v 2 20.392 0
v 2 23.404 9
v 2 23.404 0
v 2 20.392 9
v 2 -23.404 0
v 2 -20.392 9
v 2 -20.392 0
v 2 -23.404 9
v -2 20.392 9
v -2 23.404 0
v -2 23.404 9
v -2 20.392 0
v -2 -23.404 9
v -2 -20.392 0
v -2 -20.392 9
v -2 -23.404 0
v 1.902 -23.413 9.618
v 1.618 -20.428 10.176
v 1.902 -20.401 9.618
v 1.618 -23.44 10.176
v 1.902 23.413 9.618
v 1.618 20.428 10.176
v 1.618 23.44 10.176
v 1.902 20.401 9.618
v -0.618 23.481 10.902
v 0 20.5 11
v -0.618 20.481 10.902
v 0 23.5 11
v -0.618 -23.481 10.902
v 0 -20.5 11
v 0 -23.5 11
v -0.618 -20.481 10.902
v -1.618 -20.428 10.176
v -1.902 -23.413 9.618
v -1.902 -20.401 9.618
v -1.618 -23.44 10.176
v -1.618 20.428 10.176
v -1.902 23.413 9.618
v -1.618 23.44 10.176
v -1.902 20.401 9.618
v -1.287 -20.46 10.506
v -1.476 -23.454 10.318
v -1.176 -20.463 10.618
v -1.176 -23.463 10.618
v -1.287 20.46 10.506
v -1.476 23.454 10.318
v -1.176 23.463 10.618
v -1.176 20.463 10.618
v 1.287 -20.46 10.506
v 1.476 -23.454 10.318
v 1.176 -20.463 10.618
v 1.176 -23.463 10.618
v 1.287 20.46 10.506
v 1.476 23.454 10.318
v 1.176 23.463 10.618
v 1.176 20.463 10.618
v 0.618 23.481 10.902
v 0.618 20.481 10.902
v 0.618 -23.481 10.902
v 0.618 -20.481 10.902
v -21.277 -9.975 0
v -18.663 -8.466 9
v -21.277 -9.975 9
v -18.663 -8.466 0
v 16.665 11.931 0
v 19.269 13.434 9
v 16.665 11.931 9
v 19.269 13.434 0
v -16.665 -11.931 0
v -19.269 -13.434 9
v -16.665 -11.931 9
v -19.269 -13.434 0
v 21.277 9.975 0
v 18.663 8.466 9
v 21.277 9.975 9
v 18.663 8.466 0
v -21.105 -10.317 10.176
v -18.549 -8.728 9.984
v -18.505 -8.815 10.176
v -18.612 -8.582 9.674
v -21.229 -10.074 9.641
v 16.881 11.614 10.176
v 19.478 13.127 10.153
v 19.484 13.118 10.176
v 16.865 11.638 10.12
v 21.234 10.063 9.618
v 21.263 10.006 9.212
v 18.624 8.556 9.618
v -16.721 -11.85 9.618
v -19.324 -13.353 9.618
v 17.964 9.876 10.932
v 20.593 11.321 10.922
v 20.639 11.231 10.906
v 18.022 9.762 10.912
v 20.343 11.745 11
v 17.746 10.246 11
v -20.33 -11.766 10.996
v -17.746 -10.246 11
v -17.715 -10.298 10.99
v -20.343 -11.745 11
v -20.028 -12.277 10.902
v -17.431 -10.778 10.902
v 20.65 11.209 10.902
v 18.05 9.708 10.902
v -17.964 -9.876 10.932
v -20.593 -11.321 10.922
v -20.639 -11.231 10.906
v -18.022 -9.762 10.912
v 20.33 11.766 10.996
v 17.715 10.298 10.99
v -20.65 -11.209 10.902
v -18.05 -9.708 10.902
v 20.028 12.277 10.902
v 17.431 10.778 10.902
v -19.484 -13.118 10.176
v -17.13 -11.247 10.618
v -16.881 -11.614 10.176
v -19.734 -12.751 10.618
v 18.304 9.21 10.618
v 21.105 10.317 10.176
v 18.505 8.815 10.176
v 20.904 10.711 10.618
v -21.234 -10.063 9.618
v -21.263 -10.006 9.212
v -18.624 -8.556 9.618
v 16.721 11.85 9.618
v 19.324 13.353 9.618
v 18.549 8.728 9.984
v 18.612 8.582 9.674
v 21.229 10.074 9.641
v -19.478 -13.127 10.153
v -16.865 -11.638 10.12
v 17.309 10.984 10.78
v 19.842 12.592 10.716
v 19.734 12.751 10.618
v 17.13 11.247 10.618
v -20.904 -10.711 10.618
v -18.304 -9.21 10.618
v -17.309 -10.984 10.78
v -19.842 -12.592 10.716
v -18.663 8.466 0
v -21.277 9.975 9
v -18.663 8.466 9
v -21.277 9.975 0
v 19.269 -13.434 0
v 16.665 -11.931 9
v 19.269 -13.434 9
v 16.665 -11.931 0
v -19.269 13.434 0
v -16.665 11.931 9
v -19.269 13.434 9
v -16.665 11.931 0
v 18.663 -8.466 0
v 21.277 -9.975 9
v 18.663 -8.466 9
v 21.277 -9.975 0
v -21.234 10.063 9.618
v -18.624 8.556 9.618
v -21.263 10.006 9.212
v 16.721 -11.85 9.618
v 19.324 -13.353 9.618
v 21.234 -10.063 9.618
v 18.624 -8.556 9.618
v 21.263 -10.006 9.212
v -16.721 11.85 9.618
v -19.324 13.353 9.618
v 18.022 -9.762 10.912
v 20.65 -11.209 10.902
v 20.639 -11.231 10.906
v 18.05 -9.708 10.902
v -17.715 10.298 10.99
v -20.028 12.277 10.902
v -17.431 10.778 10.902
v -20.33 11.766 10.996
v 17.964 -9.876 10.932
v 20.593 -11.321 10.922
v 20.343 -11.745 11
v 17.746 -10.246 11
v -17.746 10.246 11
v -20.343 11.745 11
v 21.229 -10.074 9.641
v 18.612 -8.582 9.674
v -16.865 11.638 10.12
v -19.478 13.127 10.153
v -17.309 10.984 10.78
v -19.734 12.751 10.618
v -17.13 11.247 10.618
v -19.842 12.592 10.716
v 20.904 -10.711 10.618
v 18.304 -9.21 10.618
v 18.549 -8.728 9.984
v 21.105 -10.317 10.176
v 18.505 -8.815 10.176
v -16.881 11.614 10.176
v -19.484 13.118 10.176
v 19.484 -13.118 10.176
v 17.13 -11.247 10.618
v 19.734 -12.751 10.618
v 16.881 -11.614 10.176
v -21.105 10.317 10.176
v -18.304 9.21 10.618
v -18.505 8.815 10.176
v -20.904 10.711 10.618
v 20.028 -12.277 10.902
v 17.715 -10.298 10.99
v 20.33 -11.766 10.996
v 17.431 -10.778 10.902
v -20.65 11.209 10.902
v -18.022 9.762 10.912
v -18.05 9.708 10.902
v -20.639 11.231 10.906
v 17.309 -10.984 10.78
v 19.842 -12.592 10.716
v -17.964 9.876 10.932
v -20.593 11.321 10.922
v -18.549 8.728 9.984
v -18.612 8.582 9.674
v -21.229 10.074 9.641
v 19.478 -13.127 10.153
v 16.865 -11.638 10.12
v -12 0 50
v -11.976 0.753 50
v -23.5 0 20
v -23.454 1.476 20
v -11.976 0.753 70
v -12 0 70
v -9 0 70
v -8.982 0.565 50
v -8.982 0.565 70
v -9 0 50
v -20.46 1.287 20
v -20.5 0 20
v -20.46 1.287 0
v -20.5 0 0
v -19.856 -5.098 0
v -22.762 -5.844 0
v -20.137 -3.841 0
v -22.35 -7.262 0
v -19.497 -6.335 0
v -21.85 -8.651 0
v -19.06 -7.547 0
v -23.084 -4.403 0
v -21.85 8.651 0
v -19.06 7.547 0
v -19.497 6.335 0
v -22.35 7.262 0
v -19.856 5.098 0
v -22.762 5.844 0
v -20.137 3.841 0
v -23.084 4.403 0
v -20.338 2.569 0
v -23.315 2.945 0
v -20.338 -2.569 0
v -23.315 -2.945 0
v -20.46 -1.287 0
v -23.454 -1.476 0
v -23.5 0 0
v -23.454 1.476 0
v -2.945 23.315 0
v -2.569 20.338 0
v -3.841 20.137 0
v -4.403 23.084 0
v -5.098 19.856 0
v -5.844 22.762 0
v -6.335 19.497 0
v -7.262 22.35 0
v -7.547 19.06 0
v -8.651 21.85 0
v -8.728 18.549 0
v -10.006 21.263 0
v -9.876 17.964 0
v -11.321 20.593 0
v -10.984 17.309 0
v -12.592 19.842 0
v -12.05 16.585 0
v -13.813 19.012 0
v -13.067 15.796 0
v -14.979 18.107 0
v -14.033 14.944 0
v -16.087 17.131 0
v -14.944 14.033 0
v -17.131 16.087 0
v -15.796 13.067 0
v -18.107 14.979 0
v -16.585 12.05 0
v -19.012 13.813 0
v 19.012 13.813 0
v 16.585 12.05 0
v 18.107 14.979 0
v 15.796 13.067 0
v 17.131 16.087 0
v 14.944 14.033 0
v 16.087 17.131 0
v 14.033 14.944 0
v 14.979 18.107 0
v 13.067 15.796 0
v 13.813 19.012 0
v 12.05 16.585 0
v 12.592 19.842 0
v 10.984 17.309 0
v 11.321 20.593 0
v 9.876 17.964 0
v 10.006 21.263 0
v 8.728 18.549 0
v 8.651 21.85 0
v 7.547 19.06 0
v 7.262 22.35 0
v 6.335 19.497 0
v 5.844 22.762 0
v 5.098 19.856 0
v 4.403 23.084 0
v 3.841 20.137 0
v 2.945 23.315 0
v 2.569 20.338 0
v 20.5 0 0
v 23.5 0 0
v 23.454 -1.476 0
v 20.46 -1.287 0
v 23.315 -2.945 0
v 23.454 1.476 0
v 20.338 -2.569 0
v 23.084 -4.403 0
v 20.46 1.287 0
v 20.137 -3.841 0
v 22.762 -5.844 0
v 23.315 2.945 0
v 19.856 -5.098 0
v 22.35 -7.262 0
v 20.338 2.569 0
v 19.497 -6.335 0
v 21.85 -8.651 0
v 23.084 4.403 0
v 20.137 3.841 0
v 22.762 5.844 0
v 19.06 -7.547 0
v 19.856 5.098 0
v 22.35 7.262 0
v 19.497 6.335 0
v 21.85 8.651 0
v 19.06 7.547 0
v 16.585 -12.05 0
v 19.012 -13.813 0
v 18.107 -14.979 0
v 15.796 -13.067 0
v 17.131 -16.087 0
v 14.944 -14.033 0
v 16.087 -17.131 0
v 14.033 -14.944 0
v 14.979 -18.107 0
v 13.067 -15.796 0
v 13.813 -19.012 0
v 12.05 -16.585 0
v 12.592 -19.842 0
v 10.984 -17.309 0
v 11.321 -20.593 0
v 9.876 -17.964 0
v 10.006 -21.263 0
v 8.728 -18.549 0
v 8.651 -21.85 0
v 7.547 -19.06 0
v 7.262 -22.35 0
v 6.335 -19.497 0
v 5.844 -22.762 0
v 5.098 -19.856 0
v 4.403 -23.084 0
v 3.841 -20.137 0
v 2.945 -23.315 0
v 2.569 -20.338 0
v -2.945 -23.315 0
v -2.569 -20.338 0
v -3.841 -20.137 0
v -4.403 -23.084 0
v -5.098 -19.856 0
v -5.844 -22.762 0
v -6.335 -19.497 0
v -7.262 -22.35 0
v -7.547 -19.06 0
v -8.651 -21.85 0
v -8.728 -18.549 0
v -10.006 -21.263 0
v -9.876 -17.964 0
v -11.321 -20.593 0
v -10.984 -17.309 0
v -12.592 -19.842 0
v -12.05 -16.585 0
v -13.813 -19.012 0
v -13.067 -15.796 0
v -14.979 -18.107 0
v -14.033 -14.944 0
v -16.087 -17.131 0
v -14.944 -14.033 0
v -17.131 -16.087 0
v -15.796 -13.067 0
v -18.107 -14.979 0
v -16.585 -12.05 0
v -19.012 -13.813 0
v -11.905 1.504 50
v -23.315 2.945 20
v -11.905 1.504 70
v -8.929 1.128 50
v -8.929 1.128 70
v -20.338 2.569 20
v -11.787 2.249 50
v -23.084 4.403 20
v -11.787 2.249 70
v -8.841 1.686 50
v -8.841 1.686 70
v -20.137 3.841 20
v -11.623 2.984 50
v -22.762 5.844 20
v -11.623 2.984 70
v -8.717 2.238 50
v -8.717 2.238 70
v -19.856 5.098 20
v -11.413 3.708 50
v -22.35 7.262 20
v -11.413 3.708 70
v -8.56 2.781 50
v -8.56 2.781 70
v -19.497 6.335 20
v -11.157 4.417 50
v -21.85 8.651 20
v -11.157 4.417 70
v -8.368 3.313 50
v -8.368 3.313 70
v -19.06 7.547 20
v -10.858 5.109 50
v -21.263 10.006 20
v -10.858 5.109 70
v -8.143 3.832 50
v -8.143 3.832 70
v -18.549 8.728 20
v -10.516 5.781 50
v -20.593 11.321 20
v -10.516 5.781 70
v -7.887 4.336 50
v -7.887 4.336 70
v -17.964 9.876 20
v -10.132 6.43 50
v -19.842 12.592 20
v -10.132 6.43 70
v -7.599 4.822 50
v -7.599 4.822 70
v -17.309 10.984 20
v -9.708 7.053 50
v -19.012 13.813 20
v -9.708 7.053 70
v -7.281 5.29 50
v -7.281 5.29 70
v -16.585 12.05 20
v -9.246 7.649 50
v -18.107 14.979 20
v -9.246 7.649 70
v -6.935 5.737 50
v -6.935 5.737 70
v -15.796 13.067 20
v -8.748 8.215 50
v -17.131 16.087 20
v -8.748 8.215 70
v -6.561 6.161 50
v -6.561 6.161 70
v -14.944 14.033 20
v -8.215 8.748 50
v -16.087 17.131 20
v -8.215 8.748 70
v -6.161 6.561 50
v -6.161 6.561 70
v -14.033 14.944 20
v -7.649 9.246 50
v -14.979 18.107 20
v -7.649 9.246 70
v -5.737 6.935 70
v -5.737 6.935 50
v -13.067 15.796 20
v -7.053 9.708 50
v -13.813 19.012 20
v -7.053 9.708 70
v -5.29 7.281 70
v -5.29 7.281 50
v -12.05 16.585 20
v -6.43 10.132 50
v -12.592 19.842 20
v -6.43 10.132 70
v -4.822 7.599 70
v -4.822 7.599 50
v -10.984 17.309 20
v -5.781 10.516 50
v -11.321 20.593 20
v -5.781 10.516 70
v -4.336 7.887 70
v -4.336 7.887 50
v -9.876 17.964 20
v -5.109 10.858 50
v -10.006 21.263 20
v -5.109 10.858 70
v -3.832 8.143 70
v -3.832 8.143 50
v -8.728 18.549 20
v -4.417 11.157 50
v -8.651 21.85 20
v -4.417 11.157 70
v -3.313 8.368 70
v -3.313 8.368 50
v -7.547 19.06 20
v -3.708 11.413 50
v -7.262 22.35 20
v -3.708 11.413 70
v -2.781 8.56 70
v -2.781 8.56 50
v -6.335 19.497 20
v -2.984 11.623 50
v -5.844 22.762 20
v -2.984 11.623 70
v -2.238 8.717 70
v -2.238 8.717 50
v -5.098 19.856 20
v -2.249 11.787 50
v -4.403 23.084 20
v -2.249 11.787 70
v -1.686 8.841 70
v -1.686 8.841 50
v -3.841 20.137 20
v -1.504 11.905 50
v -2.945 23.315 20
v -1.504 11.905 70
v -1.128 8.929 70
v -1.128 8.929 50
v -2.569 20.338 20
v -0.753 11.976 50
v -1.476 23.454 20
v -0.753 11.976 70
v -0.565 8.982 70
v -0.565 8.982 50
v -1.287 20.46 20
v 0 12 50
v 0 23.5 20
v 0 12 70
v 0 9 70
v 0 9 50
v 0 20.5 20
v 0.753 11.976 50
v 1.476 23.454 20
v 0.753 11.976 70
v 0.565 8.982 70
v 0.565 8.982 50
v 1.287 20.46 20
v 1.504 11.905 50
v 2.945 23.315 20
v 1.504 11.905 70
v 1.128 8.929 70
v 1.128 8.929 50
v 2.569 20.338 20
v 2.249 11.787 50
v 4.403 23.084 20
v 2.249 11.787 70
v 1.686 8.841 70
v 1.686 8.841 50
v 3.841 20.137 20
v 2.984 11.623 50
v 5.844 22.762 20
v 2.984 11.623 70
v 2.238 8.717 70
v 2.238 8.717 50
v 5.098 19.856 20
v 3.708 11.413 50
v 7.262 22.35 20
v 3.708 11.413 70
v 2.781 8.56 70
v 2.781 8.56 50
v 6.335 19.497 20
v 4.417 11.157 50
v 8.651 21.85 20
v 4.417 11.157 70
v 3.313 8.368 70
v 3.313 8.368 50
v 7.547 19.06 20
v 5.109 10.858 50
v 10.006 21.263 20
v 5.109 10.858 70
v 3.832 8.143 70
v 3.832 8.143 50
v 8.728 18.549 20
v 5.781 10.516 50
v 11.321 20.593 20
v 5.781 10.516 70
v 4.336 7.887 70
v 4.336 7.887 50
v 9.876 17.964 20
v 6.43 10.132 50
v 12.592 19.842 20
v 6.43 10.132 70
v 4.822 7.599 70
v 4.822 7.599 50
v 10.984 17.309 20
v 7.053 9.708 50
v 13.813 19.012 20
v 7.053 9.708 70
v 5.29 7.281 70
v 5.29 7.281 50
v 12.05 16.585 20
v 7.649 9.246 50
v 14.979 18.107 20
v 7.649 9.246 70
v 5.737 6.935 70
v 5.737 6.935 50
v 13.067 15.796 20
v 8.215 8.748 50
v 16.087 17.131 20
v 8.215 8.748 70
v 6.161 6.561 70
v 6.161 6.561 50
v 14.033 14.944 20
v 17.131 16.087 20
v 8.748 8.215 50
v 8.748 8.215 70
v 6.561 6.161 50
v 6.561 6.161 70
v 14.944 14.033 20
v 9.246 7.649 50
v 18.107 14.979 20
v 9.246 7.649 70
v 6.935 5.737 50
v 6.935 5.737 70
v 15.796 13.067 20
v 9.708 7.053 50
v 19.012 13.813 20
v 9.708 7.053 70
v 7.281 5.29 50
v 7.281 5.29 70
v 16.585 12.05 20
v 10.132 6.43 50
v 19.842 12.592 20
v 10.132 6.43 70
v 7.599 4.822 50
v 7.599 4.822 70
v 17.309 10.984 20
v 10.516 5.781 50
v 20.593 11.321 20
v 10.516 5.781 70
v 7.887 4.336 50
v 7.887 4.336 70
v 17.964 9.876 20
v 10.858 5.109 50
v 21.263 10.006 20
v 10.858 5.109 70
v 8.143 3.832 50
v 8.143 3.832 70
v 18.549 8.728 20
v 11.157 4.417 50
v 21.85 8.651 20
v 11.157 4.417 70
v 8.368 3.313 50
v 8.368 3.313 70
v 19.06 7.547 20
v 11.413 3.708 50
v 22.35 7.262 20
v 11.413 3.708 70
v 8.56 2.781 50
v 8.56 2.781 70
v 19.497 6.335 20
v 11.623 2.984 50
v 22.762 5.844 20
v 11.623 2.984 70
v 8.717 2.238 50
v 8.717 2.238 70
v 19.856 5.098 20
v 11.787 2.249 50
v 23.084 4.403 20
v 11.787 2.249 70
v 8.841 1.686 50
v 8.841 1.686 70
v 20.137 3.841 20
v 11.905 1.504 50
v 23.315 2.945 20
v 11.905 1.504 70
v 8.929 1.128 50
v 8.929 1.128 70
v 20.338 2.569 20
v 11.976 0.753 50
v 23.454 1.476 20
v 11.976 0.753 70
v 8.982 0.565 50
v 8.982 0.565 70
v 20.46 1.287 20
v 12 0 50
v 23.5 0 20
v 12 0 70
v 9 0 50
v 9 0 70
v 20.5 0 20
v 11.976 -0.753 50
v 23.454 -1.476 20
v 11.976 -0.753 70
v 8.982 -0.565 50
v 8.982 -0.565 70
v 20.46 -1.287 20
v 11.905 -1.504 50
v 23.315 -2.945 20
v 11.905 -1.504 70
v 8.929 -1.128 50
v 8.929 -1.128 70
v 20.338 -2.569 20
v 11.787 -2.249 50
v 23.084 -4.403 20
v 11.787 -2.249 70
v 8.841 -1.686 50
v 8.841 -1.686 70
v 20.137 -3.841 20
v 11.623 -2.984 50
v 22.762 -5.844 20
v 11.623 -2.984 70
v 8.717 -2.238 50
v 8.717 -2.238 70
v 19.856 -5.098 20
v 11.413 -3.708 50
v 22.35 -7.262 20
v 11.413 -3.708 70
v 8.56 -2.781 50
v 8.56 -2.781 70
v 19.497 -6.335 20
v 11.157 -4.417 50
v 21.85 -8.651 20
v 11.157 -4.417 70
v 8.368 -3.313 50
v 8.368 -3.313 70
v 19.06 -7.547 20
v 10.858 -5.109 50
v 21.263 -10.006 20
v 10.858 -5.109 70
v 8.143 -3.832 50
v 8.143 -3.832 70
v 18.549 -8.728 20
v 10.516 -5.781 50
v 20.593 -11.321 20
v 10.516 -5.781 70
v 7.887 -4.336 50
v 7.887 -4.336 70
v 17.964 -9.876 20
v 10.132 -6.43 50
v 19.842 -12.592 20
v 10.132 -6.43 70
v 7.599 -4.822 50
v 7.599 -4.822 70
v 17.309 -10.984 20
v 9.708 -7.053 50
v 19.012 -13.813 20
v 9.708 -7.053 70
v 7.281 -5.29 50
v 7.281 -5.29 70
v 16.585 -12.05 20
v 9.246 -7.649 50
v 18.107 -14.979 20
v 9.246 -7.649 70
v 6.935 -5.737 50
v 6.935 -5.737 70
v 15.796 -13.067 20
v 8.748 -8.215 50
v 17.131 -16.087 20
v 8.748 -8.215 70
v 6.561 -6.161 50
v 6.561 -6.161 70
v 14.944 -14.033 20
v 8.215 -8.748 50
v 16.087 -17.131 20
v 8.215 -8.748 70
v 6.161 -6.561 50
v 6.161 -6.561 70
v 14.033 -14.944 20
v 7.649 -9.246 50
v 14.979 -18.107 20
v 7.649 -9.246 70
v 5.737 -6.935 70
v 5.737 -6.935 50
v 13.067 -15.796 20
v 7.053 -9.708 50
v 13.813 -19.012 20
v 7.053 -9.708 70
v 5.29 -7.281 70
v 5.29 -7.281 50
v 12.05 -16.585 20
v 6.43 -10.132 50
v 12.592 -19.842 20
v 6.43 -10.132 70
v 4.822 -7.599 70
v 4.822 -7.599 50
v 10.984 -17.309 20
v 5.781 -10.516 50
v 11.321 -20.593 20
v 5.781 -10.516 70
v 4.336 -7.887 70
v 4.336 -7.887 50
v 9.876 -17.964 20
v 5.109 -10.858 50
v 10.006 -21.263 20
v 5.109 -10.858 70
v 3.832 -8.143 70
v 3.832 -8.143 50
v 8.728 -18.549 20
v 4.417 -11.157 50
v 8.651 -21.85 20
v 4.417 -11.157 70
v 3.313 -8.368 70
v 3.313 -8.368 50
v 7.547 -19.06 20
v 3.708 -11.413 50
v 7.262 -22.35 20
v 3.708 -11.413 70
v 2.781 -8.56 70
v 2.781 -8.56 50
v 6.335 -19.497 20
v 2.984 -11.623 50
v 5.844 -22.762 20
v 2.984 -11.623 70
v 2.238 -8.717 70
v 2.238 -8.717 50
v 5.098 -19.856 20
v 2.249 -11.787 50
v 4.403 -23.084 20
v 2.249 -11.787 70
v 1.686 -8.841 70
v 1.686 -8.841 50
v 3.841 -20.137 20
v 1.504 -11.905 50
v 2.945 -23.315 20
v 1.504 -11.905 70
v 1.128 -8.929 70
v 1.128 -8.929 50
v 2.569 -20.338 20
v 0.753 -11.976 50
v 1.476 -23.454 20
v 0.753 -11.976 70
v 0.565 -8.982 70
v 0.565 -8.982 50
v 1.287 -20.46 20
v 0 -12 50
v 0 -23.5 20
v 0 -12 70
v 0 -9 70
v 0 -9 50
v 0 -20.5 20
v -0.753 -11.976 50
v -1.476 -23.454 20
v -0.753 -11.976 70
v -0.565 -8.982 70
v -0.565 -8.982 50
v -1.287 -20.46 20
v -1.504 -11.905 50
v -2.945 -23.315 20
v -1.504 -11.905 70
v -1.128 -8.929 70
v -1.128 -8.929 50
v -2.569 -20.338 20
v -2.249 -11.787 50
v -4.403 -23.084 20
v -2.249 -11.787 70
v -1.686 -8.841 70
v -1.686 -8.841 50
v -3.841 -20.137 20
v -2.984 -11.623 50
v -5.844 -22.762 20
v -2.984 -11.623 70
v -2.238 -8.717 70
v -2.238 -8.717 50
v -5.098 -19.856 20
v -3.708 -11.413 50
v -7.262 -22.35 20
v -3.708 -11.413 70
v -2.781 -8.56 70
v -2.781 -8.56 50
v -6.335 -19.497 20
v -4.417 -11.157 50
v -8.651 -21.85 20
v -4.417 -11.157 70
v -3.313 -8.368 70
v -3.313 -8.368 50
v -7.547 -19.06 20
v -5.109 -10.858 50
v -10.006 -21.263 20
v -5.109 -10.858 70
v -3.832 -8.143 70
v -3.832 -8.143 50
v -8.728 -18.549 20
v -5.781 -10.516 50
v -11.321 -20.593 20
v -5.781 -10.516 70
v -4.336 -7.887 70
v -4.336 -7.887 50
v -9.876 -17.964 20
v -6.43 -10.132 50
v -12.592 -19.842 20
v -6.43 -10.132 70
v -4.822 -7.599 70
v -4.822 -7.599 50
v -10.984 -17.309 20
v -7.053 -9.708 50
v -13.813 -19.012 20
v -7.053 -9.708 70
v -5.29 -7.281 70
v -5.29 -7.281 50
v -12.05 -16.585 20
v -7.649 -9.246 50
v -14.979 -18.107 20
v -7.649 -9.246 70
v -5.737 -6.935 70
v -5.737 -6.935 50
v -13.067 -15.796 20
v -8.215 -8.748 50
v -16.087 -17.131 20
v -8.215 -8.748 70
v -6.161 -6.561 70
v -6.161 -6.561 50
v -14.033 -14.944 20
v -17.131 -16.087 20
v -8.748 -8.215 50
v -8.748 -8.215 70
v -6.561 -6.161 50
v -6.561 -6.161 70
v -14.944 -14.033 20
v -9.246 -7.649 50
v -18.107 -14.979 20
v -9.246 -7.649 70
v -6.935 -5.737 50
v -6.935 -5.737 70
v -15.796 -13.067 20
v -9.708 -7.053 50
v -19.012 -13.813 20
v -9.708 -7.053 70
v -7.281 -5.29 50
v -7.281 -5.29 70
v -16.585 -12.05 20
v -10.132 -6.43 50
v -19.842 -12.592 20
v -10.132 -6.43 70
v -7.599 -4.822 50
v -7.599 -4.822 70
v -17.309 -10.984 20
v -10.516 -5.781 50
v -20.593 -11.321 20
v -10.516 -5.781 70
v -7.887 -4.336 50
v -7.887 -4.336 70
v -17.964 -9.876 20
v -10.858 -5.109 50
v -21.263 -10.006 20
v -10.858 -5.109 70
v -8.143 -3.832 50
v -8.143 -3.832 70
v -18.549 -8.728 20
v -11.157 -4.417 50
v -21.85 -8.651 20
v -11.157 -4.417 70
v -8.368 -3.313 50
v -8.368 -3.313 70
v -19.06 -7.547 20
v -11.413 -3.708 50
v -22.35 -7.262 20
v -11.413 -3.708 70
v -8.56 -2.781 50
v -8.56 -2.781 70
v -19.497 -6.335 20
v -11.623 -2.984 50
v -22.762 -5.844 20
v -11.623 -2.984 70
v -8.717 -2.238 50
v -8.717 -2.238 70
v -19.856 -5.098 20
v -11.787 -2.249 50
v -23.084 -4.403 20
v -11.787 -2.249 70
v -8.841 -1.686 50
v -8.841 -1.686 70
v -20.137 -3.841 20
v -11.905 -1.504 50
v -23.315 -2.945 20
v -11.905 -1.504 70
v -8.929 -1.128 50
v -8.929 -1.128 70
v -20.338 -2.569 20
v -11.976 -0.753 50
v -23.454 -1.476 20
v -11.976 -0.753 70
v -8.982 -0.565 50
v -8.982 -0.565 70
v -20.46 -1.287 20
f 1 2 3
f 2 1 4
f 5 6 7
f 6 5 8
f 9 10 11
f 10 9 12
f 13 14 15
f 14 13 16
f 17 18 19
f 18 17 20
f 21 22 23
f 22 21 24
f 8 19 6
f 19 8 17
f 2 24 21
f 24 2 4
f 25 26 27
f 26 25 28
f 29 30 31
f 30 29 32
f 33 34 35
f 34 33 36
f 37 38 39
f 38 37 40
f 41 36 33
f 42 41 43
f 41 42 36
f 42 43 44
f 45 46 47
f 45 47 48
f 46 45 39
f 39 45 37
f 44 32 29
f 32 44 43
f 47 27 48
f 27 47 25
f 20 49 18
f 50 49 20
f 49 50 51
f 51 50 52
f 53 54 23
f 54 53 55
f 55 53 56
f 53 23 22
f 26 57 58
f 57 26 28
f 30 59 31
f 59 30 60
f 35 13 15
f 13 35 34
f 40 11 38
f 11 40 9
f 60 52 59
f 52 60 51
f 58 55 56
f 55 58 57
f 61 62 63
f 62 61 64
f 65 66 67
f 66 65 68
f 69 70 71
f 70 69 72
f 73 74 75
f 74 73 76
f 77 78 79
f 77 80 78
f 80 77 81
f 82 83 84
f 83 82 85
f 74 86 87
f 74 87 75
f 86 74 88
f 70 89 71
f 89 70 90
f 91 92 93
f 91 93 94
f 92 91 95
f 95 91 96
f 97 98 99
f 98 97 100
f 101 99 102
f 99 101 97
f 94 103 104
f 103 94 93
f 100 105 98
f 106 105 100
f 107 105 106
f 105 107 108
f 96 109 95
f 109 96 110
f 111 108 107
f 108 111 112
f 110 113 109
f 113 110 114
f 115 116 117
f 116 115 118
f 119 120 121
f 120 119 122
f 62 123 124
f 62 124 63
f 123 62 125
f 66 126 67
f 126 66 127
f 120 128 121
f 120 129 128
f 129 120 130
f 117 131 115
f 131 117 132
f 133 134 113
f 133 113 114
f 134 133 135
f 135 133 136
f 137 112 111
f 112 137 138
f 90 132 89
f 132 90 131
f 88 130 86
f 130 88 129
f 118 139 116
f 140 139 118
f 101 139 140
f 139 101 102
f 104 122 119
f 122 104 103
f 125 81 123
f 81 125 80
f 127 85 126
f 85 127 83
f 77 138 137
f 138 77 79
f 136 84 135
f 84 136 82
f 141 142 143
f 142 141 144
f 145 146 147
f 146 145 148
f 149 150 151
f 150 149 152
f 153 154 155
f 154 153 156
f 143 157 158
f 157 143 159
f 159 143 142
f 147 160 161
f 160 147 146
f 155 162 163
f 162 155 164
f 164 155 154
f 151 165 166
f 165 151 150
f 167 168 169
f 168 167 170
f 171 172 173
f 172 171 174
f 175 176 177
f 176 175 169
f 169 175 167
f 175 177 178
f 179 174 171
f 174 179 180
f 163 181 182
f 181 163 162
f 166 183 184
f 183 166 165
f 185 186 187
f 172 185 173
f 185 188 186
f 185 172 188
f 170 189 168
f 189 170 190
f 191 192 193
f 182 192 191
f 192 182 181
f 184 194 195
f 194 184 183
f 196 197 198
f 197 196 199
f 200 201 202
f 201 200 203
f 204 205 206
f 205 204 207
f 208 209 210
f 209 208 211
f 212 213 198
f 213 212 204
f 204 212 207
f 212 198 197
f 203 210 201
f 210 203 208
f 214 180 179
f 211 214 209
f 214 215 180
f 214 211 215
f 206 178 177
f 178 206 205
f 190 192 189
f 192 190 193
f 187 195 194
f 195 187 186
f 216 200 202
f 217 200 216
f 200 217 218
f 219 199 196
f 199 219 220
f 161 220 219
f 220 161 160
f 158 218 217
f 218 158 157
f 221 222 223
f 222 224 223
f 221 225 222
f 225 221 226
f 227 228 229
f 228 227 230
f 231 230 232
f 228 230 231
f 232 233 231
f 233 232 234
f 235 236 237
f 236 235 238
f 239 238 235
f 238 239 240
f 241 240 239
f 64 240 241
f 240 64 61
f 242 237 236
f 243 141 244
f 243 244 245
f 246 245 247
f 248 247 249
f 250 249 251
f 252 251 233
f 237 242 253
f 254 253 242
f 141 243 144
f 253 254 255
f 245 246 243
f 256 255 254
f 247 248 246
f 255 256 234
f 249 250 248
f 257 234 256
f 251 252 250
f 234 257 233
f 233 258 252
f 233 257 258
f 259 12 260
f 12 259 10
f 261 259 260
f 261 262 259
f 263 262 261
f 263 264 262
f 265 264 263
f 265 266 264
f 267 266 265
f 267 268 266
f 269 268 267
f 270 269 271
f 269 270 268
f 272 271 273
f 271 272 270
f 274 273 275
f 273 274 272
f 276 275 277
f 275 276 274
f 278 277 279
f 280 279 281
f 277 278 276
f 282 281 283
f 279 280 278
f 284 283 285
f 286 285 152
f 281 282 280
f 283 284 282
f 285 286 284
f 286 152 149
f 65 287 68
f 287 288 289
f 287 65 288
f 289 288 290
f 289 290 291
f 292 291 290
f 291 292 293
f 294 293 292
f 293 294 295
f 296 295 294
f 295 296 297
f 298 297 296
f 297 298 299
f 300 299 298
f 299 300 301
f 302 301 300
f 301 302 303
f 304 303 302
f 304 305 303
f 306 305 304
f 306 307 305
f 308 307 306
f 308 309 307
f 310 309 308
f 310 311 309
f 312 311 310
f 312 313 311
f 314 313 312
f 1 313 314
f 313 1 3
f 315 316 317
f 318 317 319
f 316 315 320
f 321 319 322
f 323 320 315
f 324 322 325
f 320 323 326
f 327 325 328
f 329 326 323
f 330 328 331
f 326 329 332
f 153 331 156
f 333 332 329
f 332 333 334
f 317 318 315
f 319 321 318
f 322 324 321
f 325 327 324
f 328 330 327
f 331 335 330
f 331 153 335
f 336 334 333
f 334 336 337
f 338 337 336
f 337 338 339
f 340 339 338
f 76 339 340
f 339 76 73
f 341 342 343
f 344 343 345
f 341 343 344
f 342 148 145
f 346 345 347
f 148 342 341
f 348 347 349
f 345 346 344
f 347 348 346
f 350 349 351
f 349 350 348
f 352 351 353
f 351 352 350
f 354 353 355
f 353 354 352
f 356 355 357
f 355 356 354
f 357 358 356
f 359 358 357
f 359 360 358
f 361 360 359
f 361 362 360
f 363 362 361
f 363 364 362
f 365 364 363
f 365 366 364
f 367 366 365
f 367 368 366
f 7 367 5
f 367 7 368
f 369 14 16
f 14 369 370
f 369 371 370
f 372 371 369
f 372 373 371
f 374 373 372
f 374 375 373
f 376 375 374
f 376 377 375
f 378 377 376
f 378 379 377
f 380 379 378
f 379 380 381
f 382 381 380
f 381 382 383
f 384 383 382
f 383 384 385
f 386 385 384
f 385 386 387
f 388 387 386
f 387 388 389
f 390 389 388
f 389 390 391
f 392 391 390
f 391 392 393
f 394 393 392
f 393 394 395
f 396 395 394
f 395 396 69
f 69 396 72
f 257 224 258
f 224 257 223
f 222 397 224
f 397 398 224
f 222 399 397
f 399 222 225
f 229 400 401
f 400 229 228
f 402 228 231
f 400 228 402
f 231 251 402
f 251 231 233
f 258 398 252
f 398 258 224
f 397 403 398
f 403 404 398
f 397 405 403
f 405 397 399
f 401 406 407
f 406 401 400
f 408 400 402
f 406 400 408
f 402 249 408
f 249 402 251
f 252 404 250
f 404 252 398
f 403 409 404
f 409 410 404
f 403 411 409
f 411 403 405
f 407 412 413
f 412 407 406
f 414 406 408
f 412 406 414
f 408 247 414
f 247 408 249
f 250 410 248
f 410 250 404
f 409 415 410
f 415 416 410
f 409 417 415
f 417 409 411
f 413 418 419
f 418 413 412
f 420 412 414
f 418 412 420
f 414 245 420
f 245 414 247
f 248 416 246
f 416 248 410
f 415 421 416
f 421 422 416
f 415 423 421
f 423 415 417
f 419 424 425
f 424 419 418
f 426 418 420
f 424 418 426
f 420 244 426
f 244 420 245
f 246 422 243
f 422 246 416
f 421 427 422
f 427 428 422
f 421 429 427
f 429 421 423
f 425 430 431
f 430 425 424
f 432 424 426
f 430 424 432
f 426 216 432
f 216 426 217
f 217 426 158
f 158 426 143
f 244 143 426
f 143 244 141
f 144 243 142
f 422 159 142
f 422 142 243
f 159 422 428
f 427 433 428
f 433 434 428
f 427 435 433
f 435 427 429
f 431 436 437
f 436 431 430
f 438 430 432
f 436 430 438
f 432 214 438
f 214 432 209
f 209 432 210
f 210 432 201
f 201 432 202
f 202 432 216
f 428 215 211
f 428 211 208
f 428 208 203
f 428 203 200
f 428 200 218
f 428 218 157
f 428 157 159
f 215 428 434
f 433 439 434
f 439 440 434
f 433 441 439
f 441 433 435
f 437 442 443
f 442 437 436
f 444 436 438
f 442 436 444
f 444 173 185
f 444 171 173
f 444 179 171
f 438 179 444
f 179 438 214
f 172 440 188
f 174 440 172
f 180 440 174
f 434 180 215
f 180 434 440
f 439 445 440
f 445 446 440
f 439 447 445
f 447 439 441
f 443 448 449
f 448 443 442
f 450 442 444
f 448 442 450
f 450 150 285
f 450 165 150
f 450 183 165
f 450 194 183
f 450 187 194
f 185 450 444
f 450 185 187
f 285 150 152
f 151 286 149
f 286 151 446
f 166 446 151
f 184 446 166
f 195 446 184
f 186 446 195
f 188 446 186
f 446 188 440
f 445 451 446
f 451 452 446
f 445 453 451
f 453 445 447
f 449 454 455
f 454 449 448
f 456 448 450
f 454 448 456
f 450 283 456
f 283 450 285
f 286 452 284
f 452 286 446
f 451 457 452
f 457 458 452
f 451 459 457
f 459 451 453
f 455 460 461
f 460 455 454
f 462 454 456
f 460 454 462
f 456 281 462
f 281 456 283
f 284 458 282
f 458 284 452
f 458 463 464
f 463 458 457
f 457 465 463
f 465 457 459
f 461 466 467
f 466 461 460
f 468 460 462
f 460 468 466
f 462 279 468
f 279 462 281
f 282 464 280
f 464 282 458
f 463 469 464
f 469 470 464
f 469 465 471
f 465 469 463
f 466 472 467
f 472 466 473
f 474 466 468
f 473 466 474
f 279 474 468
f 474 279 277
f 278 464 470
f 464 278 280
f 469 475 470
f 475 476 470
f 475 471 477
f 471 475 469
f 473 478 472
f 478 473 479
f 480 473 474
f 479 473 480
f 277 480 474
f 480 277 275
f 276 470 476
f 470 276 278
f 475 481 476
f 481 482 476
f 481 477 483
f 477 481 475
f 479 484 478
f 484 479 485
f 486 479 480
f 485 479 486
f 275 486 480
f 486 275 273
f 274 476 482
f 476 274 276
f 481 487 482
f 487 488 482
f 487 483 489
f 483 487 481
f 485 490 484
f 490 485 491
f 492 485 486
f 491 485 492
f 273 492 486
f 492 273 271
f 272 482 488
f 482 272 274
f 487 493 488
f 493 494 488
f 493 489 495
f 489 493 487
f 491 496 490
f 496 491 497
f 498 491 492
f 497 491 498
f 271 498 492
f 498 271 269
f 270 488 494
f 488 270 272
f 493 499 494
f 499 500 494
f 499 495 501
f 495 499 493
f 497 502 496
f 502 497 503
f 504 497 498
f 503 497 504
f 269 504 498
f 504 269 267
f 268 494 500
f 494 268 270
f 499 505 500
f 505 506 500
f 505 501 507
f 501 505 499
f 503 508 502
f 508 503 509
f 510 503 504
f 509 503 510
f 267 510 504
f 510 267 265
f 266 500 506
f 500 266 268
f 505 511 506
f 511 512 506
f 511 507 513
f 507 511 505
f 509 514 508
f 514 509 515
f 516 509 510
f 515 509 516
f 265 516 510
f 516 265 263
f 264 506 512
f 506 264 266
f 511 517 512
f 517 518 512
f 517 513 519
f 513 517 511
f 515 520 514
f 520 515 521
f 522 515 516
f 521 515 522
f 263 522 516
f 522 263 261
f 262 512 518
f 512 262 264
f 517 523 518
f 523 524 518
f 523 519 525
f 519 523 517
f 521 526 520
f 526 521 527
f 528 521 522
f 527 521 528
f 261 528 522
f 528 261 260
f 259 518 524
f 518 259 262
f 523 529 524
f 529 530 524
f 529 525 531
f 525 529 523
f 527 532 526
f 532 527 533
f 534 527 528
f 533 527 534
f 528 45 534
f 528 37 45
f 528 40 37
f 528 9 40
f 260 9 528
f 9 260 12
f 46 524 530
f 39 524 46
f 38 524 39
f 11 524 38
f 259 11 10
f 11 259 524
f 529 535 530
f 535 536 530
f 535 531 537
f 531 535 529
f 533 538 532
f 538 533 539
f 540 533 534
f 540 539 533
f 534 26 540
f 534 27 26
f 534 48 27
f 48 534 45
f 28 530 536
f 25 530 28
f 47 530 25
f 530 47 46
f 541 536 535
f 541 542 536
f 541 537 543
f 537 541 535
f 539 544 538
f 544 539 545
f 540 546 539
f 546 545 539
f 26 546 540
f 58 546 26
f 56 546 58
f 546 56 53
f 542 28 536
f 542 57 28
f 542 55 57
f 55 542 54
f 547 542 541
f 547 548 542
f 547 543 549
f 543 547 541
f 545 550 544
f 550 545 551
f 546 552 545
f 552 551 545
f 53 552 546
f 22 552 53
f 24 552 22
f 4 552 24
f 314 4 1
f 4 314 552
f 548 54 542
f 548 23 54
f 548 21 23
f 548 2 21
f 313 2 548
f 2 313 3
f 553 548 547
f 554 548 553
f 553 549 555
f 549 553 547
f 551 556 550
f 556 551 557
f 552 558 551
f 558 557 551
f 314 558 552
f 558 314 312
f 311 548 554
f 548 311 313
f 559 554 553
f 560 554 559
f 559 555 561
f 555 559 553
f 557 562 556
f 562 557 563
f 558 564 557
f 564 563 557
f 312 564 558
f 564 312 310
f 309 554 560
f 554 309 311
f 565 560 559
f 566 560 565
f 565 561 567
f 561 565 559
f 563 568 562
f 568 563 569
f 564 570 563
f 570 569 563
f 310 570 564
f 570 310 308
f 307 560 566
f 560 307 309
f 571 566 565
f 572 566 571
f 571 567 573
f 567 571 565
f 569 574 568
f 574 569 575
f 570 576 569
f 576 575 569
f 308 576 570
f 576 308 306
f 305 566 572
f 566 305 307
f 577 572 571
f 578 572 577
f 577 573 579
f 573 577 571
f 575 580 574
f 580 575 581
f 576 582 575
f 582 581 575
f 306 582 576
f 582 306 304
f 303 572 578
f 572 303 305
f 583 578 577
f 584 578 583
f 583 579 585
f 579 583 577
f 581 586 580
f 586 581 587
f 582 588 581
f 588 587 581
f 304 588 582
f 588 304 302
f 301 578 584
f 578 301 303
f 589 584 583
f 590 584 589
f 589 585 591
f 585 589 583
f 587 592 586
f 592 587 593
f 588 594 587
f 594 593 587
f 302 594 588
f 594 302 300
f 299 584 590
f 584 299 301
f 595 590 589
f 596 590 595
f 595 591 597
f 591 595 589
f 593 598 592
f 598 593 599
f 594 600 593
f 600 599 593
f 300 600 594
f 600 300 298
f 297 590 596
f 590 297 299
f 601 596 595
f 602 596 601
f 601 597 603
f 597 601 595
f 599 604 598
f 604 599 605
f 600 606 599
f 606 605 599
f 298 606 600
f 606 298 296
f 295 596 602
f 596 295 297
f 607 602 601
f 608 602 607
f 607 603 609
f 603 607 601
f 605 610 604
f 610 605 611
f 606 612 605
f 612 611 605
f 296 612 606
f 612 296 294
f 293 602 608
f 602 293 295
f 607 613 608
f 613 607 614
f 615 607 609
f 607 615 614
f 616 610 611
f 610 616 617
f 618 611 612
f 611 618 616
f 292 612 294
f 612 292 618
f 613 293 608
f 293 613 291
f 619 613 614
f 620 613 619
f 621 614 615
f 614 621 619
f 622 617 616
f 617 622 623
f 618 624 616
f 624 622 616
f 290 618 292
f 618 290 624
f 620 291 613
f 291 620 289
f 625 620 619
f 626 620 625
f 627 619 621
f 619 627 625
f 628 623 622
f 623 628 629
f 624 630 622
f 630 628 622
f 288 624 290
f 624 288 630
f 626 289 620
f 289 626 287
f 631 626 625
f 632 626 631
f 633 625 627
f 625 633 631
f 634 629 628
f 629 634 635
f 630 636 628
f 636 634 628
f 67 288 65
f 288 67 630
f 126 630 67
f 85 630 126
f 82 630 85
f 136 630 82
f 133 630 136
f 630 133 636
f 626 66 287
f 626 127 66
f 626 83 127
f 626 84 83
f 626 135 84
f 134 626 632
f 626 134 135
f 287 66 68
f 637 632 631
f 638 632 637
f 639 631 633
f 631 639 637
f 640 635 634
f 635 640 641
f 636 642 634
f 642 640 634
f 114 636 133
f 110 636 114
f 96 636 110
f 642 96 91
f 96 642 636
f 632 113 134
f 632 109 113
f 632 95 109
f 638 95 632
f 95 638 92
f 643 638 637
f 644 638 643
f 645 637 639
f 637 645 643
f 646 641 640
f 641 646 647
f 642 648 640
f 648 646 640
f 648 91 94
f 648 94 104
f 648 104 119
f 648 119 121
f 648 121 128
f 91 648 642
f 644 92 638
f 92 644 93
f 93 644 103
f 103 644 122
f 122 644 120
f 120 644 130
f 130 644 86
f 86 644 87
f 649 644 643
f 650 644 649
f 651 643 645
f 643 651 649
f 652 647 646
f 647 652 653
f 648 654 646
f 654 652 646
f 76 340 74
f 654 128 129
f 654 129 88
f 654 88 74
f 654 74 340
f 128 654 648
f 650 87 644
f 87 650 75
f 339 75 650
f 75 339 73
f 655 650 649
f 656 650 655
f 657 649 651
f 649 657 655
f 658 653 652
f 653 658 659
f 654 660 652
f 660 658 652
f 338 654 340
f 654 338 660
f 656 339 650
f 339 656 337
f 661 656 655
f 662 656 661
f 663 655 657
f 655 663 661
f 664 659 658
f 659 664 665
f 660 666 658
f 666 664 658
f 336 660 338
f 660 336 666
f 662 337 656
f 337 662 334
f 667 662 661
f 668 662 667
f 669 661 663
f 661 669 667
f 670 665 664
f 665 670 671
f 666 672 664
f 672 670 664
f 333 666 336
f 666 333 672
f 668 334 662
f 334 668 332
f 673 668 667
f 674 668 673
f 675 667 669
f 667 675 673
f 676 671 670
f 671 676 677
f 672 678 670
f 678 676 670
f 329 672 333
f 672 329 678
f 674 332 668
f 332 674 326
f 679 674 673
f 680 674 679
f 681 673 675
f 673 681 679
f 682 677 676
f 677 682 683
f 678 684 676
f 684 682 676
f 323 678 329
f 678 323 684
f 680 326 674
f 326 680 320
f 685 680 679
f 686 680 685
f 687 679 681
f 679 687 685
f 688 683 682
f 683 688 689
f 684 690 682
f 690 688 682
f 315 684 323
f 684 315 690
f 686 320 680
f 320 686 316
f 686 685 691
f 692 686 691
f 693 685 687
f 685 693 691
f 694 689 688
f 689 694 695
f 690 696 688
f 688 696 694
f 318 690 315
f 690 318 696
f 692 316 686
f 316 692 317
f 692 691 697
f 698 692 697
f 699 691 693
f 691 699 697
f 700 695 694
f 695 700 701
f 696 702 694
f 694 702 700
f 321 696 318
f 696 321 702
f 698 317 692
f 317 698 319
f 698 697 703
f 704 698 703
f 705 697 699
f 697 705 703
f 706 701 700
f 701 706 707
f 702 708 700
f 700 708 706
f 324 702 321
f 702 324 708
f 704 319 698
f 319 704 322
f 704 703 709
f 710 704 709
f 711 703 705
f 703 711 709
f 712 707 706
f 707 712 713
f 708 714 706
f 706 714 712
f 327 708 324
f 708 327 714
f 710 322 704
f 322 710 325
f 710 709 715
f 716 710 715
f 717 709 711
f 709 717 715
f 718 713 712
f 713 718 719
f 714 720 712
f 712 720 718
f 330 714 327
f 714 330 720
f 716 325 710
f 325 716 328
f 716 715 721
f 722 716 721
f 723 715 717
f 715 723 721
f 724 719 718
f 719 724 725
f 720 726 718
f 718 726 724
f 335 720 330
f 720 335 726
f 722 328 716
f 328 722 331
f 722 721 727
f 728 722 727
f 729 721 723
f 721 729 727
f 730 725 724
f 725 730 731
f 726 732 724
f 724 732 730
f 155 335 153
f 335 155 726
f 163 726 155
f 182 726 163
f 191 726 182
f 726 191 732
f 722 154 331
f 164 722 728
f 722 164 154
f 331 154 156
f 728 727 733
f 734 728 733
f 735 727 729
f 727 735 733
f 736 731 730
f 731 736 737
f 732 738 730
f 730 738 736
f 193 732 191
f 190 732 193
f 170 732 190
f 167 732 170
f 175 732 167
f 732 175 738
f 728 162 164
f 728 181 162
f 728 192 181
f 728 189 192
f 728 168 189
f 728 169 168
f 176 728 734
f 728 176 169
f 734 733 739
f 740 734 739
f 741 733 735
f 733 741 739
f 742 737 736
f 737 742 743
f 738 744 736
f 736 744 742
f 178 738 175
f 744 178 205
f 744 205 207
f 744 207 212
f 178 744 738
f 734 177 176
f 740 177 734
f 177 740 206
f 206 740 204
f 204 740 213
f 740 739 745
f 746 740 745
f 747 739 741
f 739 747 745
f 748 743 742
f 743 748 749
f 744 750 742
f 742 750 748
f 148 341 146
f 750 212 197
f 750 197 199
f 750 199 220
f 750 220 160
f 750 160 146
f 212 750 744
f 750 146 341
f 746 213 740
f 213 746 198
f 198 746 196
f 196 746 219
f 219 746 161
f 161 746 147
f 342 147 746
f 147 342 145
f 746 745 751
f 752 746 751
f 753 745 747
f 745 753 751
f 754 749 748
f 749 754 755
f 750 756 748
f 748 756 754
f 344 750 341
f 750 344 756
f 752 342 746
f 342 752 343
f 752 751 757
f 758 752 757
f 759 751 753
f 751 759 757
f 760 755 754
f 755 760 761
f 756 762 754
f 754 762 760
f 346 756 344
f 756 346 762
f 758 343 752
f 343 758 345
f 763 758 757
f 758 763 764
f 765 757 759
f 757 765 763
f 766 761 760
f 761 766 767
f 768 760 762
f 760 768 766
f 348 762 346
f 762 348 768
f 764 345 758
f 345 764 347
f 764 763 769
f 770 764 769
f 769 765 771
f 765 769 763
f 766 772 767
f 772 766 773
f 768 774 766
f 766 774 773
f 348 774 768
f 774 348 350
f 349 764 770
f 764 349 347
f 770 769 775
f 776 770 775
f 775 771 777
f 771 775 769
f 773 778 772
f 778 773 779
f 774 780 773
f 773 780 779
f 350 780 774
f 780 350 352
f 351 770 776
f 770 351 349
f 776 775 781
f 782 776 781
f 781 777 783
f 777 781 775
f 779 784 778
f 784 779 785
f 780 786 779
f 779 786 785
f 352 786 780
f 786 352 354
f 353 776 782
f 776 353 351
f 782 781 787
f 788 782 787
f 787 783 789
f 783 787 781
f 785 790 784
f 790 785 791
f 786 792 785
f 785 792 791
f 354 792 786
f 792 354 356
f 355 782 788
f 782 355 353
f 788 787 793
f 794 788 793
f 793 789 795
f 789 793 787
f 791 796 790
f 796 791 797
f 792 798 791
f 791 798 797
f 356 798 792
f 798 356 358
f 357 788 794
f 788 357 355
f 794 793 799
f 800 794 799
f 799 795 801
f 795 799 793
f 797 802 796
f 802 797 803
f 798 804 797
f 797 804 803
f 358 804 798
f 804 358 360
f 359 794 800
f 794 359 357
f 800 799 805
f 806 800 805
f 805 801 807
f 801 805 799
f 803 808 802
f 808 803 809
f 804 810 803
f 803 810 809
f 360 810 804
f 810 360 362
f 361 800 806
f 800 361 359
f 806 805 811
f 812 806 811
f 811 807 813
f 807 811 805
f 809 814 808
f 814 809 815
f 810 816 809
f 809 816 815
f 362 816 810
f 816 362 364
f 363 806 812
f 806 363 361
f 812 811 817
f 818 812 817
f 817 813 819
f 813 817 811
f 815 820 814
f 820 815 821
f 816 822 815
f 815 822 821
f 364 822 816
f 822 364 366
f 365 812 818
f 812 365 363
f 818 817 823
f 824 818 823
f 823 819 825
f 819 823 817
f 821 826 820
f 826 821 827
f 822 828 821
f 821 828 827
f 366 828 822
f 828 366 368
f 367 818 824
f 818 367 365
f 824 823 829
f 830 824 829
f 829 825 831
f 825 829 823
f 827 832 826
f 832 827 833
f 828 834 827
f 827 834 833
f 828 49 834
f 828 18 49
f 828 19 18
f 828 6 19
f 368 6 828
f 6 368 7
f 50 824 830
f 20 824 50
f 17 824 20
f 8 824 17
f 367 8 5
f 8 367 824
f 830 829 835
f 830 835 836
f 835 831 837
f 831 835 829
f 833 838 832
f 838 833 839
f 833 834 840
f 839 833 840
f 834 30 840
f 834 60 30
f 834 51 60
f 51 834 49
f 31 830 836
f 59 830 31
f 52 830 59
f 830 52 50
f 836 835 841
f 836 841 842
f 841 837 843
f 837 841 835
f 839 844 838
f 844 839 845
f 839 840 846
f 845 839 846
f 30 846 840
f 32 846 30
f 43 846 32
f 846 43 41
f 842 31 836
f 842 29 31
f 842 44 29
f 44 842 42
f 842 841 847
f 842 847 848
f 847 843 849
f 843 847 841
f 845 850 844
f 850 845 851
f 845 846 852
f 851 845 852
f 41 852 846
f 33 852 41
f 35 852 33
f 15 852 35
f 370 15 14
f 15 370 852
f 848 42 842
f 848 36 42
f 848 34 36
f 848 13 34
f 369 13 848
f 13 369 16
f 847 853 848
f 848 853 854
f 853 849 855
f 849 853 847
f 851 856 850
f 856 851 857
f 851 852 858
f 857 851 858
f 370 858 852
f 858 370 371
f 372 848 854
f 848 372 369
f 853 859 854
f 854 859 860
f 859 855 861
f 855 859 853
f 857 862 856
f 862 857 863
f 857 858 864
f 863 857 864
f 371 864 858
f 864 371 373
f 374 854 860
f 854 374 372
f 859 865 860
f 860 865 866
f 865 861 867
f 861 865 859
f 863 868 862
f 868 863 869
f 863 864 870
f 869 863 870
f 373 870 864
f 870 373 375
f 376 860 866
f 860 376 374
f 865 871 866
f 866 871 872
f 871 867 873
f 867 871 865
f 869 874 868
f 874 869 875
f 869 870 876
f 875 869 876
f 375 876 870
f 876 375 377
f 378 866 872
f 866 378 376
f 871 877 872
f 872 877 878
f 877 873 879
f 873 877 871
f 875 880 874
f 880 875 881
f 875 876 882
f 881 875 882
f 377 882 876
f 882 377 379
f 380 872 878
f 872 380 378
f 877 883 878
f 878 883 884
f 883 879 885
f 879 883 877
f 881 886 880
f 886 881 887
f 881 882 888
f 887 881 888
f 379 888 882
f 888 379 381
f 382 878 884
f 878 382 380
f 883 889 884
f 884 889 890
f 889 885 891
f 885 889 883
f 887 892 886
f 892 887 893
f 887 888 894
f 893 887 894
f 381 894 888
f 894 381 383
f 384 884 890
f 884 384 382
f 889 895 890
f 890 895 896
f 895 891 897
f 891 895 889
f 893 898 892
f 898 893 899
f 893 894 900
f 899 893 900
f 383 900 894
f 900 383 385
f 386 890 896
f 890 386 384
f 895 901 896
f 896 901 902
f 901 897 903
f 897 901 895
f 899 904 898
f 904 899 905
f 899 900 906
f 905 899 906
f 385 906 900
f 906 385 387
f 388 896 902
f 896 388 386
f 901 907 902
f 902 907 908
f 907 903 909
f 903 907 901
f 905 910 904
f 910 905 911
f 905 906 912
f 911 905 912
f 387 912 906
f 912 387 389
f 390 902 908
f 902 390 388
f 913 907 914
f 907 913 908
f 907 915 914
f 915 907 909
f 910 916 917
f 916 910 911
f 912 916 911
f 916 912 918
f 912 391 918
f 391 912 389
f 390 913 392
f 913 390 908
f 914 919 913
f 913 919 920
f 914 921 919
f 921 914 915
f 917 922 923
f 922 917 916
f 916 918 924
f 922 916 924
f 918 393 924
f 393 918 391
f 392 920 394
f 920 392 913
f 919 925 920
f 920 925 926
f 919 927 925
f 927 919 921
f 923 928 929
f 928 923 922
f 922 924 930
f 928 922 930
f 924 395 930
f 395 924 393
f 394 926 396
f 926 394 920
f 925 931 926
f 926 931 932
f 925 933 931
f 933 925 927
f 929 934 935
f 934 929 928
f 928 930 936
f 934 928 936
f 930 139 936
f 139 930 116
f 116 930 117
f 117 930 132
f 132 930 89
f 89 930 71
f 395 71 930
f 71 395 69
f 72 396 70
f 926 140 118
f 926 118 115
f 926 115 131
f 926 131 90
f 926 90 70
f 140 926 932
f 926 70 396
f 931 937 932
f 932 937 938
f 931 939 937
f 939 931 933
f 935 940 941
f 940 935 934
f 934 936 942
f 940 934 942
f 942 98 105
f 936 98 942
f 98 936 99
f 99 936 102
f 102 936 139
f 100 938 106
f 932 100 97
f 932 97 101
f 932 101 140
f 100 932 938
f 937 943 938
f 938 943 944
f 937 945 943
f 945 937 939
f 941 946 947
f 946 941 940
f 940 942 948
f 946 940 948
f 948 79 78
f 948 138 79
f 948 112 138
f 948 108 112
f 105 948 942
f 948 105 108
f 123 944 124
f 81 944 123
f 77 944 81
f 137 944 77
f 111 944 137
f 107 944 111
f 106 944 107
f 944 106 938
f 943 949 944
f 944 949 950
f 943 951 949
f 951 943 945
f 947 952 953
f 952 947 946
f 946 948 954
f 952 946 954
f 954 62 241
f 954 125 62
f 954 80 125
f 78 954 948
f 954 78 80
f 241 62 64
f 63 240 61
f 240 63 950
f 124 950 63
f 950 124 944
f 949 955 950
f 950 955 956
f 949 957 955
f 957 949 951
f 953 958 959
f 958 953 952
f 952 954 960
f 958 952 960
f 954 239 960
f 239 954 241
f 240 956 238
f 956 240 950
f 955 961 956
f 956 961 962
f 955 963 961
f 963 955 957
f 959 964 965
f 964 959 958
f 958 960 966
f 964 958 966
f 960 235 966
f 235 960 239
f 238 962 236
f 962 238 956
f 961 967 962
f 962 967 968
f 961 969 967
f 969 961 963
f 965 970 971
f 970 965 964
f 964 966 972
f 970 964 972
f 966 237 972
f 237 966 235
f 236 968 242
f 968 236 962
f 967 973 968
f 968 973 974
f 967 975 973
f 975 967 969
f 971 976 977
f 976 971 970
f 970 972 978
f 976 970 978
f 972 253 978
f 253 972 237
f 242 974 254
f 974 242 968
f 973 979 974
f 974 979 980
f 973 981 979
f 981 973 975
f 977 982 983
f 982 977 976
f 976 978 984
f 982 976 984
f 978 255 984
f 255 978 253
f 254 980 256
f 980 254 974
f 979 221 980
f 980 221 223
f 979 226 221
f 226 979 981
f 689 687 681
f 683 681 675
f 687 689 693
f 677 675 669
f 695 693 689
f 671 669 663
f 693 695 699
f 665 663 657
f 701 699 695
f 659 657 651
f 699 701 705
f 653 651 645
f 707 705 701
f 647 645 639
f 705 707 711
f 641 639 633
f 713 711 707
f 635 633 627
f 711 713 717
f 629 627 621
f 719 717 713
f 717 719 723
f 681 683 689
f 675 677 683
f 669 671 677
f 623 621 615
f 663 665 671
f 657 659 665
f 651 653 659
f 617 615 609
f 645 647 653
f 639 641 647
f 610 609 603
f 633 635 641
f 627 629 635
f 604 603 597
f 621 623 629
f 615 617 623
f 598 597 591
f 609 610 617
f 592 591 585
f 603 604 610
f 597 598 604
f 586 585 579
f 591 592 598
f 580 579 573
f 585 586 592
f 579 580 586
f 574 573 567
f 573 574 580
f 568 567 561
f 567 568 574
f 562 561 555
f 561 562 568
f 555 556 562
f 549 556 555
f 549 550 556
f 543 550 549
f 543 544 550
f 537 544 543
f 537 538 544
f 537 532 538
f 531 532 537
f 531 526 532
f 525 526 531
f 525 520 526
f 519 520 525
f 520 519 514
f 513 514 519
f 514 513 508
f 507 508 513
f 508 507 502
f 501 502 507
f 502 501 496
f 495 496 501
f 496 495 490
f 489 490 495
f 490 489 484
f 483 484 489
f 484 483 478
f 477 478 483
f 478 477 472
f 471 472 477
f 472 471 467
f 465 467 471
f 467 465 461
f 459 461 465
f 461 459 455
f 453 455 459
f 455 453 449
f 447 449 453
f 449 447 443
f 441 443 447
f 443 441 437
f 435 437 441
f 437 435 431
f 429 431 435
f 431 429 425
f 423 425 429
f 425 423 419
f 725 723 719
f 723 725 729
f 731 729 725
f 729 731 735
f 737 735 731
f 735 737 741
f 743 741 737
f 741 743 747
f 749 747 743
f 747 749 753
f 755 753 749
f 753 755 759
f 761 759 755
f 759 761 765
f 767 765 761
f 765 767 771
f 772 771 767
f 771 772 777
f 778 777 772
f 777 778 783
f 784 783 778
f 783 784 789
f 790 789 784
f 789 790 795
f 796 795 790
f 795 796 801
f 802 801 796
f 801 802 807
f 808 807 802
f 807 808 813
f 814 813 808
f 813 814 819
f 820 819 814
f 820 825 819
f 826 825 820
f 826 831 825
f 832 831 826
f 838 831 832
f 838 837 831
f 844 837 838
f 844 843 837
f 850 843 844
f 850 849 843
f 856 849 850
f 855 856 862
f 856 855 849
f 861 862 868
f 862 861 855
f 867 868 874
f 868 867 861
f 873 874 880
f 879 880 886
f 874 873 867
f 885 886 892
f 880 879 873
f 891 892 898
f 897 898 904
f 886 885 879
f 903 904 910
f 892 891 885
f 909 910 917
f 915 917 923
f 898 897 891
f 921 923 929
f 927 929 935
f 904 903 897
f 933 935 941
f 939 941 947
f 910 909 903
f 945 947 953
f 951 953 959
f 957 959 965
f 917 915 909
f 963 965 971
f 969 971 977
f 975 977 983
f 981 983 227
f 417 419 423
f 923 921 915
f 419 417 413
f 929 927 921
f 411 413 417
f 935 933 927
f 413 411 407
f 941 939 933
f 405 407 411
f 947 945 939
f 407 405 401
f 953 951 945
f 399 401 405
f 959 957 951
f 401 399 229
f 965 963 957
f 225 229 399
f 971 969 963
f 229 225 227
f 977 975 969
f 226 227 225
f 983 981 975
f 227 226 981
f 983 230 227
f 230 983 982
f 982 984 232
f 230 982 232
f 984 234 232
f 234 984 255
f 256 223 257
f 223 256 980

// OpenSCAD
 /* 
 Parametric Nozzle/Hose Adaptor 
 
    My wife was having trouble dring out the tube on her CPAP machine after a cleaning. 
    She was holding her hair dryer against the end of the hose because most of the air 
    was not making its way into the tube, so I decided to make one of these.
    
    The original model was just hand designed in a 3d modeling tool, which I quickly
    realized would only work for people who had exactly the same hairdryer and hose.
    
    This lead to the decision to make a parametric version. This design is set up for
    attachment to the outside of a source which plugs in to the inside of something else.
    
    If you need to, for some reason, attach it the other way around, you'll need to do
    some quick math around the diameters and the widths, but note: the optional slots 
    are only set up to be on the "source" side of the adaptor.
    
    About those slots... just a heads up, the slot goes all of the way through the
    adaptor, so there's no difference between one slot or two, because they're just
    overlapping. Similarly, 2 or 4 slots... 3 or 6... 10 or 20... etc.
 
 */
 
 // PARAMETERS START HERE ------------------------------------- //
 
 wallThickness = 3;

 // radius of source tube 
 
 sourceRadius = 20.5;
 sourceLength = 20;

 // attributes of the transition segment.  Longer transitions may make for better airflow?
 
 transitionLength = 30;
 
 // radius of output tube
 outputRadius = 12;
 outputLength = 20;

 // it might be helpful to have slots in the adaptor base.
 numSlots = 3;
 slotWidth = 4;
 slotHeight = 10;

// END OF PARAMETERS ------------------------------------- // 
 
 
difference() {

//rotate the shape around the z-axis

rotate_extrude(angle = 360,  $fn = 100) {

// 2d slice of the shape
polygon([
[sourceRadius,0],[sourceRadius+wallThickness,0],[sourceRadius+wallThickness,sourceLength],
[outputRadius,transitionLength+sourceLength],[outputRadius,transitionLength+sourceLength+outputLength],
[outputRadius-wallThickness,transitionLength+sourceLength+outputLength],
[outputRadius - wallThickness, transitionLength+sourceLength],[sourceRadius,sourceLength]
]);

}
// do subtractions

// numDegrees per slot
currentRotation = 0;
degreesPerSlot = (360/numSlots);

for (a =[0:degreesPerSlot:360]) {
    echo(a);
translate ([0,0,slotHeight/2-1]) {
  rotate([0,0,a]) {
     cube([slotWidth,(sourceRadius*2+10),slotHeight], center=true); } }

translate ([0,0,slotHeight-1]) {
  rotate([90,0,a]) {
     cylinder(h=sourceRadius*2+10, r=slotWidth/2, center=true, $fn = 20); } }

 currentRotation = currentRotation+degreesPerSlot;

 }
}
